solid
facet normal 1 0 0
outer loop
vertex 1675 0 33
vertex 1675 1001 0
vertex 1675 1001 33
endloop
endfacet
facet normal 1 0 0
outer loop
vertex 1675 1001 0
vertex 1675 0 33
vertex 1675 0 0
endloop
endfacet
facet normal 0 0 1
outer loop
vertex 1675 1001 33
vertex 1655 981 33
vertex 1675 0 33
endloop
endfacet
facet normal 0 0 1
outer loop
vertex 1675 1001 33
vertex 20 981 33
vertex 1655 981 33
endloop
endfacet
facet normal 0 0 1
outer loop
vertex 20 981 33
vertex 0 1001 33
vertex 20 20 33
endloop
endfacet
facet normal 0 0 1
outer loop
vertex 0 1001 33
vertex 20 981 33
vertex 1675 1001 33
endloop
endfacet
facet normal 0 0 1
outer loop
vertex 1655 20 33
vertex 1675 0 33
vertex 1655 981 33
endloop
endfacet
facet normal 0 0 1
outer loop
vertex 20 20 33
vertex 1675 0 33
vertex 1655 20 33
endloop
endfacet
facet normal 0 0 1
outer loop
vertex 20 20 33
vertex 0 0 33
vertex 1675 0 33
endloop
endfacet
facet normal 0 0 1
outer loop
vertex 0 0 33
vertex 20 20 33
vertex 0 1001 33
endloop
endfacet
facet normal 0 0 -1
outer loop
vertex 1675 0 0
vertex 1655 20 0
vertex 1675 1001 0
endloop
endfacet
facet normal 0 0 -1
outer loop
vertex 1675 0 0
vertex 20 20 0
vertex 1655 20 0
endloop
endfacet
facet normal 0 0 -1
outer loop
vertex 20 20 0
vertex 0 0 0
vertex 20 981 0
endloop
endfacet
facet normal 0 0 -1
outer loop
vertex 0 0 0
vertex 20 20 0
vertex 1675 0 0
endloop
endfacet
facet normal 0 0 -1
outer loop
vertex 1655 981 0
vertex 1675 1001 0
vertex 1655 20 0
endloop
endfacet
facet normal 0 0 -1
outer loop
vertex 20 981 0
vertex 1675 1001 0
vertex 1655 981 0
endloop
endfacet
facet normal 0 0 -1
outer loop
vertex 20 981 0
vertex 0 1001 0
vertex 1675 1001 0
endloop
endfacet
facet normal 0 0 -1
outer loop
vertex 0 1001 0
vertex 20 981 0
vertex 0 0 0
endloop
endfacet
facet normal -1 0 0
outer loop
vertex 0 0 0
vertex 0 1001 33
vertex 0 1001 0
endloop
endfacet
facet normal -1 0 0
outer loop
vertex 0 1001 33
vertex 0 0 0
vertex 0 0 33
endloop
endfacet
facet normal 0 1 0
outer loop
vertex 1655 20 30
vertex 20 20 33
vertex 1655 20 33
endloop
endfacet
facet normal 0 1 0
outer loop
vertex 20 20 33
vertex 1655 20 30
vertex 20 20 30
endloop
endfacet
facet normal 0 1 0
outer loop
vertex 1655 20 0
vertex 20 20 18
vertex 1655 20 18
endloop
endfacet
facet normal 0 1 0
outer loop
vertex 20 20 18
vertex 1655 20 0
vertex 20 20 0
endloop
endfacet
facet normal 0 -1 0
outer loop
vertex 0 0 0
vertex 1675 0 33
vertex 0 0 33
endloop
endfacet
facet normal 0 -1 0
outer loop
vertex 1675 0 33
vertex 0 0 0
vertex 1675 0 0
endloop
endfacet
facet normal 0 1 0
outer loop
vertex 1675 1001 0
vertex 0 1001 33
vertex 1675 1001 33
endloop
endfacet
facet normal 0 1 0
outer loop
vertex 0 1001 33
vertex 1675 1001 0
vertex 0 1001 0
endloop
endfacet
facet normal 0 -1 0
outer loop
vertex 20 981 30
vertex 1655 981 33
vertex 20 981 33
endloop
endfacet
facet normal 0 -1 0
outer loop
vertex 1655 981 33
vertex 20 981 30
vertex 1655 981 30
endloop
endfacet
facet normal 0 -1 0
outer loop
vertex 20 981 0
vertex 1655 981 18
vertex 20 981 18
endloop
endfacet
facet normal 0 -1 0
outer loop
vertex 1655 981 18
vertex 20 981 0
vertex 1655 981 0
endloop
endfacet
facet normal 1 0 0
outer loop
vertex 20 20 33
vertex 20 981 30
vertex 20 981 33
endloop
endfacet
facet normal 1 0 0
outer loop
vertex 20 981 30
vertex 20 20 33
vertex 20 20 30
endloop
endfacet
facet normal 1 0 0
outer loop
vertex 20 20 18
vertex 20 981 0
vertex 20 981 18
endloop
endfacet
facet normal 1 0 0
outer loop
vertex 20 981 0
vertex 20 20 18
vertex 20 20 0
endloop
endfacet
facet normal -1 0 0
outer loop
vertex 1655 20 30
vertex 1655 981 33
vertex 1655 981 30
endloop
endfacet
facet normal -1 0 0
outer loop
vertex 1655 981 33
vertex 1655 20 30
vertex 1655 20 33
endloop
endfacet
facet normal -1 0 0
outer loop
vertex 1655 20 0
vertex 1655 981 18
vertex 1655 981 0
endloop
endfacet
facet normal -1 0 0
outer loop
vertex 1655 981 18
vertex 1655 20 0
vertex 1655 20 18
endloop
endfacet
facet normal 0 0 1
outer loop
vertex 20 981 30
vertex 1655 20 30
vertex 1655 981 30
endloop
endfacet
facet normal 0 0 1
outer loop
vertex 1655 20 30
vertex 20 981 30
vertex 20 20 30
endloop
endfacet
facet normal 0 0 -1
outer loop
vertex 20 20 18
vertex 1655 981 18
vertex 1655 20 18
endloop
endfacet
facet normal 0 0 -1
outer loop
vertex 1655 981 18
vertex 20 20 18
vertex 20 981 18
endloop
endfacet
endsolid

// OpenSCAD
module solarpanel_sunmodule_protect_SW250_mono_black()
{
        //1675 x 1001 x 33 mm
        color("lightgray") {
                cube([1675, 20,  33]);
                translate([0, 1001-20, 0])
                        cube([1675, 20,  33]);
                cube([20, 1001,  33]);
                translate([1675-20, 0, 0])
                        cube([20, 1001,  33]);
        }
        color([1, 1, 1, 1]) {
                translate([20, 20, 18])
                        cube([1675-2*20, 1001-2*20,  12]);
        }
        color("black") {
                w = 158;
                d = 15;
                for (x = [0 : 9]) {
                        for (y = [0 : 5]) {
                                translate([34 + x*160, 22 + y*160, 31])
                                polygon([[d,0],[w-d,0],[w,d],[w,w-d],[w-d,w],[d,w],[0,w-d],[0,d],[d,0]]);
                        }
                }
        }
}

solarpanel_sunmodule_protect_SW250_mono_black();
